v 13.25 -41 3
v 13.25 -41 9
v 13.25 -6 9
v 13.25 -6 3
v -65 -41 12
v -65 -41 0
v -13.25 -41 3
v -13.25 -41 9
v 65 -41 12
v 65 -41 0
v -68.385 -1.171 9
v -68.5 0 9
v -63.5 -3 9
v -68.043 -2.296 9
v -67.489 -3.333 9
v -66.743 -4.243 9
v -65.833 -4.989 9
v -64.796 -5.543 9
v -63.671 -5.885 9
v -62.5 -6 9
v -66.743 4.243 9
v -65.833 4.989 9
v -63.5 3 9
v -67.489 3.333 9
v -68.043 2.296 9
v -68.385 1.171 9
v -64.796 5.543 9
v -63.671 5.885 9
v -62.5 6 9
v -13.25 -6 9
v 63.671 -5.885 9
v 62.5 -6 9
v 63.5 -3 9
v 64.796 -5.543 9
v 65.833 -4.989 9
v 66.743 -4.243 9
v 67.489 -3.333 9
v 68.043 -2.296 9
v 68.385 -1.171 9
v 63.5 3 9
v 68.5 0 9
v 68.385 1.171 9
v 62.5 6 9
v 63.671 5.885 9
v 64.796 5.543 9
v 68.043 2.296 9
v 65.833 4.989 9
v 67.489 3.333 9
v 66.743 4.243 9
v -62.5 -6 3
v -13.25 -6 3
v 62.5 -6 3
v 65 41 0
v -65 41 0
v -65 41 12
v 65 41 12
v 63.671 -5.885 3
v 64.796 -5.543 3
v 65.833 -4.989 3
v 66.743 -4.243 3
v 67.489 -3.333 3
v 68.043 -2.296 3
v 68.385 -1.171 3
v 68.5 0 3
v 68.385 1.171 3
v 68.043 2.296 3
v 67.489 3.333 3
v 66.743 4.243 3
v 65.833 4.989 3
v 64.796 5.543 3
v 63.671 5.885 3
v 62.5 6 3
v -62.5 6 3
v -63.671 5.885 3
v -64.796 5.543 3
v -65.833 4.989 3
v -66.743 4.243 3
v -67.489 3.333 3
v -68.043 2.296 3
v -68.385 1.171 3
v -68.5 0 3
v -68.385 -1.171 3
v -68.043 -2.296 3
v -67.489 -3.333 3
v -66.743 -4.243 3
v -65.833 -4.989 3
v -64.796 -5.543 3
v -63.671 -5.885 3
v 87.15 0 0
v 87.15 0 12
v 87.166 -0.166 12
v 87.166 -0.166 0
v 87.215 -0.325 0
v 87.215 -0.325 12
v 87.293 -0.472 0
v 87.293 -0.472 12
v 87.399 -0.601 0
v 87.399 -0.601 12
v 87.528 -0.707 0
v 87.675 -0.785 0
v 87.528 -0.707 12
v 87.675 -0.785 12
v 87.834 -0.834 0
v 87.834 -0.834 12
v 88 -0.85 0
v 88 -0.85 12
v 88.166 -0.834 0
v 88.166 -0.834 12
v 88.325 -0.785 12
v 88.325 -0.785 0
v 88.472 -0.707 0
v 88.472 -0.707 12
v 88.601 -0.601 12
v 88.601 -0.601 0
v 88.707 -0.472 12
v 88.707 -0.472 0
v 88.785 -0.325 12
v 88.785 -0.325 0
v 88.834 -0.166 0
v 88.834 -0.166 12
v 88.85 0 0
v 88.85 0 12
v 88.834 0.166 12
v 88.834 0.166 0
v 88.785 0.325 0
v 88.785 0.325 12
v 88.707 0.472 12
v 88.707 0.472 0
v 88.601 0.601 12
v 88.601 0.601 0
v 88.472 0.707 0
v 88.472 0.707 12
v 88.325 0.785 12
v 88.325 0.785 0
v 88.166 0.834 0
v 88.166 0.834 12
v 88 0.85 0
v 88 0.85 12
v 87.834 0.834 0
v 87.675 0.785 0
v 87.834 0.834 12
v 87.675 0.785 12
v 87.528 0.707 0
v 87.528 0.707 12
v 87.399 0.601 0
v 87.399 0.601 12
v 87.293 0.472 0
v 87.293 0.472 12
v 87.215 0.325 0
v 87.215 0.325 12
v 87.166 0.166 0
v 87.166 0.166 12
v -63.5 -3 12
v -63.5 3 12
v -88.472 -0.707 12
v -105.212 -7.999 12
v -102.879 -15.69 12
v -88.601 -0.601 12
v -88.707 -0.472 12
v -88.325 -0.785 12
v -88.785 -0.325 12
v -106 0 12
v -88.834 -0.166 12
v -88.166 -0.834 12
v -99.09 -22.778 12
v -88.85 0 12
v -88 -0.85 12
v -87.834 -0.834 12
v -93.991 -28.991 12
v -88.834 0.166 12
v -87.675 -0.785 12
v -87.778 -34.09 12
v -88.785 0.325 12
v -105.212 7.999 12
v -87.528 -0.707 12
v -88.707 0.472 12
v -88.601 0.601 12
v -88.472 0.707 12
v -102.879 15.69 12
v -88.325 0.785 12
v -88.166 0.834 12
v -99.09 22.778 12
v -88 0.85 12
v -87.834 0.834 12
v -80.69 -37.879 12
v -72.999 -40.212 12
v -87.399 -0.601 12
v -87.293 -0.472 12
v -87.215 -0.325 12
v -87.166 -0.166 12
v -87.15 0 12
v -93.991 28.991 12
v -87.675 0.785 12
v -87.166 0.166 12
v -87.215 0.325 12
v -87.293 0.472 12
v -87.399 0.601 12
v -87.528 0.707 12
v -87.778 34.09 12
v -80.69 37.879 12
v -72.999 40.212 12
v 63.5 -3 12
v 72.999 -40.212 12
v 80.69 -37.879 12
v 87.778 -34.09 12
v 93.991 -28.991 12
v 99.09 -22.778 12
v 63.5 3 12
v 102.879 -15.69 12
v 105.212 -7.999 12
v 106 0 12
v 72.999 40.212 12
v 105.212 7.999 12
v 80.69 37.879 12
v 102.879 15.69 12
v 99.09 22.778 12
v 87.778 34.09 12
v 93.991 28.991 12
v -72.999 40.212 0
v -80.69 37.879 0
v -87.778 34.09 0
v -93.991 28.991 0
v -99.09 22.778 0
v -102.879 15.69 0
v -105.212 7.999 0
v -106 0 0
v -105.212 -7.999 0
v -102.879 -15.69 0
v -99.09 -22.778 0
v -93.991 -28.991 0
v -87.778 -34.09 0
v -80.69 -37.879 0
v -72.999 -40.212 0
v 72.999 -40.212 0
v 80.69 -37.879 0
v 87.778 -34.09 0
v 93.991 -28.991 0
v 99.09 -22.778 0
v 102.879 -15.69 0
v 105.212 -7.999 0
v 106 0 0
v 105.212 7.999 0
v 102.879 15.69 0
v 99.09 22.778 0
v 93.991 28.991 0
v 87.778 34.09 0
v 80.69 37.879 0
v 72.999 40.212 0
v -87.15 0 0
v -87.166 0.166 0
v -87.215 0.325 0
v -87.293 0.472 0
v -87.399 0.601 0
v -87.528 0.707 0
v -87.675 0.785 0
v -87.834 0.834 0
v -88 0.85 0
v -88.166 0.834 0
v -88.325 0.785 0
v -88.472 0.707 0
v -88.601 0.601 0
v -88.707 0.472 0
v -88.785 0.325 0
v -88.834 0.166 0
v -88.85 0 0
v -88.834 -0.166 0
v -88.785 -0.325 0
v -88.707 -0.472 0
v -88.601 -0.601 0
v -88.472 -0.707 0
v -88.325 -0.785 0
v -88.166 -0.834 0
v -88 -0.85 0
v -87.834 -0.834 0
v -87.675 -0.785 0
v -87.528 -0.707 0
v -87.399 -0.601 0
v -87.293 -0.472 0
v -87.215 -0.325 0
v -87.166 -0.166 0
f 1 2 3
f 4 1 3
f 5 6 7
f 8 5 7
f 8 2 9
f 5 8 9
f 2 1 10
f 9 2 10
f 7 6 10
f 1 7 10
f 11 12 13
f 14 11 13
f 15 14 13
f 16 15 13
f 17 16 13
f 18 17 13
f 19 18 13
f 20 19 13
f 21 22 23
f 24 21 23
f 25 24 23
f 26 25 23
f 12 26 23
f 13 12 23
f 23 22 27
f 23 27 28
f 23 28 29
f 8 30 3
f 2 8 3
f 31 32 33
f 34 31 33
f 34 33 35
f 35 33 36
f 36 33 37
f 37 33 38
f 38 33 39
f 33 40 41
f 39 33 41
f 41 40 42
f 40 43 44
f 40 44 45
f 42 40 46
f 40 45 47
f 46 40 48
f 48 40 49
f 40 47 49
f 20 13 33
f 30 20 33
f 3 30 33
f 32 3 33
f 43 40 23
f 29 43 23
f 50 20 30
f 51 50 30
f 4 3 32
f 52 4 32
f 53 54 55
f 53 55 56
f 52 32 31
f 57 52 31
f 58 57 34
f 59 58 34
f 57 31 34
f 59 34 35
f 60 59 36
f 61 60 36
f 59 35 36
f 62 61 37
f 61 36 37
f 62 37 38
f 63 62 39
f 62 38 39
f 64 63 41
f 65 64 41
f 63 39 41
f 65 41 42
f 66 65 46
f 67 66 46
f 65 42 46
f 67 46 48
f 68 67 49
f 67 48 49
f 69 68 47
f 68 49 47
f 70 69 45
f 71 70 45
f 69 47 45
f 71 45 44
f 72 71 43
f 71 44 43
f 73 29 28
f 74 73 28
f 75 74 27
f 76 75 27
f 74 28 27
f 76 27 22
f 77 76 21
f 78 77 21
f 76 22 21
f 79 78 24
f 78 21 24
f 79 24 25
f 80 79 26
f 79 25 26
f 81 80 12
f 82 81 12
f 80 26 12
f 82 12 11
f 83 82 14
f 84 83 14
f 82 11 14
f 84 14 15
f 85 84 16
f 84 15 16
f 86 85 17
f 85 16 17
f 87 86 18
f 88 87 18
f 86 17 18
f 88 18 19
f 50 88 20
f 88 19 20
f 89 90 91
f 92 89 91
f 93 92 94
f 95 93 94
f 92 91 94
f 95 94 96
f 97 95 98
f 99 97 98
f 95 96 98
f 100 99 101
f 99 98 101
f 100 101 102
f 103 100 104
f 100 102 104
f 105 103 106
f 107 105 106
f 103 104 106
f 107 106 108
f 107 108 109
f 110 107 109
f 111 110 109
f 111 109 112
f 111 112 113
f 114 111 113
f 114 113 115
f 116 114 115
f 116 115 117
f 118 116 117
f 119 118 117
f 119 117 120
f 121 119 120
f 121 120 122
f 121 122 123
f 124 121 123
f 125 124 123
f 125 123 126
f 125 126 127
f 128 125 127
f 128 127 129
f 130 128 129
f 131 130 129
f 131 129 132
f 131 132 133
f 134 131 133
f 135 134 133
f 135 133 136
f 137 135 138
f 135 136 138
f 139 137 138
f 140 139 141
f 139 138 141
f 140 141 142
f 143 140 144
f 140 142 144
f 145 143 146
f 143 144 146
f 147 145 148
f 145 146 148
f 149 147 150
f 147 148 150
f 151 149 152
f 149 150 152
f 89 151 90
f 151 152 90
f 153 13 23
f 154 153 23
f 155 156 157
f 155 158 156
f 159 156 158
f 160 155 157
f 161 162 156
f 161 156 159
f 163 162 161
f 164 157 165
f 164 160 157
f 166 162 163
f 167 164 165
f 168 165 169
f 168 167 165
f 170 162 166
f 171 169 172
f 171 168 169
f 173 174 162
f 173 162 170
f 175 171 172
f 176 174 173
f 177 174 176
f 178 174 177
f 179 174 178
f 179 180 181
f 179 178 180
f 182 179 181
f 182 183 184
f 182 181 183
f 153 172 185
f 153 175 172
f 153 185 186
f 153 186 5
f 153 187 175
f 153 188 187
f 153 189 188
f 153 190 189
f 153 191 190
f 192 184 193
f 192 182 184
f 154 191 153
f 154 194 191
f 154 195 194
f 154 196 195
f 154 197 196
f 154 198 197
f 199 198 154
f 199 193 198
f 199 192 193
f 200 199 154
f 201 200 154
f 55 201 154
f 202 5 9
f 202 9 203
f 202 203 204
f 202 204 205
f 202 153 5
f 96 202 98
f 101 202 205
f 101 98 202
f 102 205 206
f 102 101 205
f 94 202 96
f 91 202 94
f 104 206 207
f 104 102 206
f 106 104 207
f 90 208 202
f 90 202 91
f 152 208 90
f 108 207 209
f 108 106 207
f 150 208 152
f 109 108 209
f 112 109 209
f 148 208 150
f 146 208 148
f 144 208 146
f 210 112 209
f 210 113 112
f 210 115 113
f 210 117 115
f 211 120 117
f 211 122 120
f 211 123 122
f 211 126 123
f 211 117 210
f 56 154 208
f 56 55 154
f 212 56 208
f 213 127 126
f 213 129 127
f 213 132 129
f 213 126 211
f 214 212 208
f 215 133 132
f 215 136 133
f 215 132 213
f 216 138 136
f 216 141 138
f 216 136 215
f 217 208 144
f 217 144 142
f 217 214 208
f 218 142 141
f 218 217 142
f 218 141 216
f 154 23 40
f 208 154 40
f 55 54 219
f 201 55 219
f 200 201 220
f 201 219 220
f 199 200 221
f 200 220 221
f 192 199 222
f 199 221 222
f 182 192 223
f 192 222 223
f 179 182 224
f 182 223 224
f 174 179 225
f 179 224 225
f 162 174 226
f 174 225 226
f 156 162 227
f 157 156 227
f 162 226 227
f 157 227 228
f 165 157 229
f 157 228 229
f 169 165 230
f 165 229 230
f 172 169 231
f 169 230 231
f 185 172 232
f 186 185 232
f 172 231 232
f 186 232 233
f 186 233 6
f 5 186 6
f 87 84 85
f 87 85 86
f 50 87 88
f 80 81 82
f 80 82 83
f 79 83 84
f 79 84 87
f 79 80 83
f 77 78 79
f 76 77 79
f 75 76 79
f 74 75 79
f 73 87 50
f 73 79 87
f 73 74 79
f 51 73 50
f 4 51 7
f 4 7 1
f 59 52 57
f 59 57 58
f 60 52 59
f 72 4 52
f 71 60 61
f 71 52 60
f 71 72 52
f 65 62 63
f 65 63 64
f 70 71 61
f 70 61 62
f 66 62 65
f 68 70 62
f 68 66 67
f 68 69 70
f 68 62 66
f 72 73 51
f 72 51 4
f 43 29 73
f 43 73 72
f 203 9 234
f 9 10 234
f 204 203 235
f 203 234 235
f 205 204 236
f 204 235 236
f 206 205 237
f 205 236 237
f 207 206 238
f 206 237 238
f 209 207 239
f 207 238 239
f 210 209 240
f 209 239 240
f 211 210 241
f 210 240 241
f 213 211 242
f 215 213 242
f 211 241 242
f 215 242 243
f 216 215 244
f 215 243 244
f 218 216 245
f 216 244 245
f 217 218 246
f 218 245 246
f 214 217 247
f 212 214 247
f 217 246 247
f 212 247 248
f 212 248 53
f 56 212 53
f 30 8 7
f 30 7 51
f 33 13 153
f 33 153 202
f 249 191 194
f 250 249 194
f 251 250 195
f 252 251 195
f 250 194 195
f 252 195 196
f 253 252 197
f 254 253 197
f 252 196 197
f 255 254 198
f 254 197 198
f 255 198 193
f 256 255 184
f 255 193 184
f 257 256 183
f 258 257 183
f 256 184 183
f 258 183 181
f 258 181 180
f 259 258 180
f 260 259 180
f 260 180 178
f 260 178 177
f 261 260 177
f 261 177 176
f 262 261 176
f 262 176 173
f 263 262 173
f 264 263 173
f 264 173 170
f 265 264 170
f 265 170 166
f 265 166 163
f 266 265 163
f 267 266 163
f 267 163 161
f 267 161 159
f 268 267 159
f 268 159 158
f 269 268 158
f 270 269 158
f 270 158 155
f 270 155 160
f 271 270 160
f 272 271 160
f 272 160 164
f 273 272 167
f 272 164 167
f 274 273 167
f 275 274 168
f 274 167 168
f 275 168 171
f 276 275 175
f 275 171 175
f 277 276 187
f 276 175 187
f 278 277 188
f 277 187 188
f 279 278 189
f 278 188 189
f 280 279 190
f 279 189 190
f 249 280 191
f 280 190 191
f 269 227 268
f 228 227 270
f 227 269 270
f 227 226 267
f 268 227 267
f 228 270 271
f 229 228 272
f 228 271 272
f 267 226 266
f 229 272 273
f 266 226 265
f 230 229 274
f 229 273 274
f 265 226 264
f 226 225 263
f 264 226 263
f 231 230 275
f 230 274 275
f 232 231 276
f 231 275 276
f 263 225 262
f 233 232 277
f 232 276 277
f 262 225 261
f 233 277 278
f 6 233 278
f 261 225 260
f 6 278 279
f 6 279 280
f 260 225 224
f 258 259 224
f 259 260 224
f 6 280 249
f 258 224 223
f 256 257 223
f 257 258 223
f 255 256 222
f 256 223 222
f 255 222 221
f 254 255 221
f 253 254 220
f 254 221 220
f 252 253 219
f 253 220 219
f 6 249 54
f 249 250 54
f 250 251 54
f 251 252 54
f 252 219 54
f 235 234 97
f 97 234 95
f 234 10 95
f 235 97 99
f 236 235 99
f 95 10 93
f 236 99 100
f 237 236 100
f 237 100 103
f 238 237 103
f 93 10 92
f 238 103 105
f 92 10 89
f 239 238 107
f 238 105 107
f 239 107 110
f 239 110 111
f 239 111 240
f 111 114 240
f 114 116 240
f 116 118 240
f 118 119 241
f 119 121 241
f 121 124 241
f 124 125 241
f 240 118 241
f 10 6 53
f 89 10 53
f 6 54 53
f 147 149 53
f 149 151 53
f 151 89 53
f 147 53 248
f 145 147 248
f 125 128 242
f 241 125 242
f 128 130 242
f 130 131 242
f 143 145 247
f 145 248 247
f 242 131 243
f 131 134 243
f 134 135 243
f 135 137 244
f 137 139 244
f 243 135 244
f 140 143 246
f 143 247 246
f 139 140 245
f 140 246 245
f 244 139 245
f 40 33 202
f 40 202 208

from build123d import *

# Parameters (mm, degrees)
PAD_DEPTH          = 9
POCKET_DEPTH       = 6
SKETCH002_W        = 26.5
SKETCH002_H        = 35
POCKET001_DEPTH    = 6
SKETCH003_W        = 127
SKETCH003_H        = 6
PAD001_DEPTH       = 3
SKETCH004_R        = 0.85
POCKET002_DEPTH    = 467.245989
POLARPATTERN_COUNT = 2


with BuildPart() as part:
    # Sketch → Pad (new body)
    with BuildSketch(Plane.XY):
        with BuildLine():
            ThreePointArc((-65, 41), (-106, 0), (-65, -41))
            Line((-65, -41), (65, -41))
            ThreePointArc((65, -41), (106, 0), (65, 41))
            Line((-65, 41), (65, 41))
        make_face()
    extrude(amount=PAD_DEPTH)

    # Sketch001 (on Face6 of Pad) → Pocket (cut)
    with BuildSketch(Plane.XY.offset(9)):
        with BuildLine():
            ThreePointArc((-62.5, 6), (-68.5, 0), (-62.5, -6))
            Line((-62.5, -6), (62.5, -6))
            ThreePointArc((62.5, -6), (68.5, 0), (62.5, 6))
            Line((-62.5, 6), (62.5, 6))
        make_face()
    extrude(amount=-POCKET_DEPTH, mode=Mode.SUBTRACT)

    # Sketch002 (on Face5 of Pocket) → Pocket001 (cut)
    with BuildSketch(Plane.XY.offset(9)):
        with Locations((0, -23.5)):
            Rectangle(SKETCH002_W, SKETCH002_H)
    extrude(amount=-POCKET001_DEPTH, mode=Mode.SUBTRACT)

    # Sketch003 (on Face5 of Pocket001) → Pad001 (join)
    with BuildSketch(Plane.XY.offset(9)):
        with BuildLine():
            ThreePointArc((-65, 41), (-106, 0), (-65, -41))
            Line((-65, -41), (65, -41))
            ThreePointArc((65, -41), (106, 0), (65, 41))
            Line((-65, 41), (65, 41))
        make_face()
        Rectangle(SKETCH003_W, SKETCH003_H, mode=Mode.SUBTRACT)
    extrude(amount=PAD001_DEPTH)

    # Sketch004 (on Face12 of Pad001) → Pocket002 (cut, through all)
    with BuildSketch(Plane.XY.offset(12)):
        with Locations((-88, 0)):
            Circle(SKETCH004_R)
    pocket002 = extrude(amount=-POCKET002_DEPTH, mode=Mode.SUBTRACT)

    # PolarPattern: Pocket002 ×2 about axis
    polarpattern_axis = Axis((0, 0, 12), (0, 0, 1))
    for i in range(1, POLARPATTERN_COUNT):
        add(pocket002.rotate(polarpattern_axis, i * 360 / POLARPATTERN_COUNT), mode=Mode.SUBTRACT)


solid = part.part
